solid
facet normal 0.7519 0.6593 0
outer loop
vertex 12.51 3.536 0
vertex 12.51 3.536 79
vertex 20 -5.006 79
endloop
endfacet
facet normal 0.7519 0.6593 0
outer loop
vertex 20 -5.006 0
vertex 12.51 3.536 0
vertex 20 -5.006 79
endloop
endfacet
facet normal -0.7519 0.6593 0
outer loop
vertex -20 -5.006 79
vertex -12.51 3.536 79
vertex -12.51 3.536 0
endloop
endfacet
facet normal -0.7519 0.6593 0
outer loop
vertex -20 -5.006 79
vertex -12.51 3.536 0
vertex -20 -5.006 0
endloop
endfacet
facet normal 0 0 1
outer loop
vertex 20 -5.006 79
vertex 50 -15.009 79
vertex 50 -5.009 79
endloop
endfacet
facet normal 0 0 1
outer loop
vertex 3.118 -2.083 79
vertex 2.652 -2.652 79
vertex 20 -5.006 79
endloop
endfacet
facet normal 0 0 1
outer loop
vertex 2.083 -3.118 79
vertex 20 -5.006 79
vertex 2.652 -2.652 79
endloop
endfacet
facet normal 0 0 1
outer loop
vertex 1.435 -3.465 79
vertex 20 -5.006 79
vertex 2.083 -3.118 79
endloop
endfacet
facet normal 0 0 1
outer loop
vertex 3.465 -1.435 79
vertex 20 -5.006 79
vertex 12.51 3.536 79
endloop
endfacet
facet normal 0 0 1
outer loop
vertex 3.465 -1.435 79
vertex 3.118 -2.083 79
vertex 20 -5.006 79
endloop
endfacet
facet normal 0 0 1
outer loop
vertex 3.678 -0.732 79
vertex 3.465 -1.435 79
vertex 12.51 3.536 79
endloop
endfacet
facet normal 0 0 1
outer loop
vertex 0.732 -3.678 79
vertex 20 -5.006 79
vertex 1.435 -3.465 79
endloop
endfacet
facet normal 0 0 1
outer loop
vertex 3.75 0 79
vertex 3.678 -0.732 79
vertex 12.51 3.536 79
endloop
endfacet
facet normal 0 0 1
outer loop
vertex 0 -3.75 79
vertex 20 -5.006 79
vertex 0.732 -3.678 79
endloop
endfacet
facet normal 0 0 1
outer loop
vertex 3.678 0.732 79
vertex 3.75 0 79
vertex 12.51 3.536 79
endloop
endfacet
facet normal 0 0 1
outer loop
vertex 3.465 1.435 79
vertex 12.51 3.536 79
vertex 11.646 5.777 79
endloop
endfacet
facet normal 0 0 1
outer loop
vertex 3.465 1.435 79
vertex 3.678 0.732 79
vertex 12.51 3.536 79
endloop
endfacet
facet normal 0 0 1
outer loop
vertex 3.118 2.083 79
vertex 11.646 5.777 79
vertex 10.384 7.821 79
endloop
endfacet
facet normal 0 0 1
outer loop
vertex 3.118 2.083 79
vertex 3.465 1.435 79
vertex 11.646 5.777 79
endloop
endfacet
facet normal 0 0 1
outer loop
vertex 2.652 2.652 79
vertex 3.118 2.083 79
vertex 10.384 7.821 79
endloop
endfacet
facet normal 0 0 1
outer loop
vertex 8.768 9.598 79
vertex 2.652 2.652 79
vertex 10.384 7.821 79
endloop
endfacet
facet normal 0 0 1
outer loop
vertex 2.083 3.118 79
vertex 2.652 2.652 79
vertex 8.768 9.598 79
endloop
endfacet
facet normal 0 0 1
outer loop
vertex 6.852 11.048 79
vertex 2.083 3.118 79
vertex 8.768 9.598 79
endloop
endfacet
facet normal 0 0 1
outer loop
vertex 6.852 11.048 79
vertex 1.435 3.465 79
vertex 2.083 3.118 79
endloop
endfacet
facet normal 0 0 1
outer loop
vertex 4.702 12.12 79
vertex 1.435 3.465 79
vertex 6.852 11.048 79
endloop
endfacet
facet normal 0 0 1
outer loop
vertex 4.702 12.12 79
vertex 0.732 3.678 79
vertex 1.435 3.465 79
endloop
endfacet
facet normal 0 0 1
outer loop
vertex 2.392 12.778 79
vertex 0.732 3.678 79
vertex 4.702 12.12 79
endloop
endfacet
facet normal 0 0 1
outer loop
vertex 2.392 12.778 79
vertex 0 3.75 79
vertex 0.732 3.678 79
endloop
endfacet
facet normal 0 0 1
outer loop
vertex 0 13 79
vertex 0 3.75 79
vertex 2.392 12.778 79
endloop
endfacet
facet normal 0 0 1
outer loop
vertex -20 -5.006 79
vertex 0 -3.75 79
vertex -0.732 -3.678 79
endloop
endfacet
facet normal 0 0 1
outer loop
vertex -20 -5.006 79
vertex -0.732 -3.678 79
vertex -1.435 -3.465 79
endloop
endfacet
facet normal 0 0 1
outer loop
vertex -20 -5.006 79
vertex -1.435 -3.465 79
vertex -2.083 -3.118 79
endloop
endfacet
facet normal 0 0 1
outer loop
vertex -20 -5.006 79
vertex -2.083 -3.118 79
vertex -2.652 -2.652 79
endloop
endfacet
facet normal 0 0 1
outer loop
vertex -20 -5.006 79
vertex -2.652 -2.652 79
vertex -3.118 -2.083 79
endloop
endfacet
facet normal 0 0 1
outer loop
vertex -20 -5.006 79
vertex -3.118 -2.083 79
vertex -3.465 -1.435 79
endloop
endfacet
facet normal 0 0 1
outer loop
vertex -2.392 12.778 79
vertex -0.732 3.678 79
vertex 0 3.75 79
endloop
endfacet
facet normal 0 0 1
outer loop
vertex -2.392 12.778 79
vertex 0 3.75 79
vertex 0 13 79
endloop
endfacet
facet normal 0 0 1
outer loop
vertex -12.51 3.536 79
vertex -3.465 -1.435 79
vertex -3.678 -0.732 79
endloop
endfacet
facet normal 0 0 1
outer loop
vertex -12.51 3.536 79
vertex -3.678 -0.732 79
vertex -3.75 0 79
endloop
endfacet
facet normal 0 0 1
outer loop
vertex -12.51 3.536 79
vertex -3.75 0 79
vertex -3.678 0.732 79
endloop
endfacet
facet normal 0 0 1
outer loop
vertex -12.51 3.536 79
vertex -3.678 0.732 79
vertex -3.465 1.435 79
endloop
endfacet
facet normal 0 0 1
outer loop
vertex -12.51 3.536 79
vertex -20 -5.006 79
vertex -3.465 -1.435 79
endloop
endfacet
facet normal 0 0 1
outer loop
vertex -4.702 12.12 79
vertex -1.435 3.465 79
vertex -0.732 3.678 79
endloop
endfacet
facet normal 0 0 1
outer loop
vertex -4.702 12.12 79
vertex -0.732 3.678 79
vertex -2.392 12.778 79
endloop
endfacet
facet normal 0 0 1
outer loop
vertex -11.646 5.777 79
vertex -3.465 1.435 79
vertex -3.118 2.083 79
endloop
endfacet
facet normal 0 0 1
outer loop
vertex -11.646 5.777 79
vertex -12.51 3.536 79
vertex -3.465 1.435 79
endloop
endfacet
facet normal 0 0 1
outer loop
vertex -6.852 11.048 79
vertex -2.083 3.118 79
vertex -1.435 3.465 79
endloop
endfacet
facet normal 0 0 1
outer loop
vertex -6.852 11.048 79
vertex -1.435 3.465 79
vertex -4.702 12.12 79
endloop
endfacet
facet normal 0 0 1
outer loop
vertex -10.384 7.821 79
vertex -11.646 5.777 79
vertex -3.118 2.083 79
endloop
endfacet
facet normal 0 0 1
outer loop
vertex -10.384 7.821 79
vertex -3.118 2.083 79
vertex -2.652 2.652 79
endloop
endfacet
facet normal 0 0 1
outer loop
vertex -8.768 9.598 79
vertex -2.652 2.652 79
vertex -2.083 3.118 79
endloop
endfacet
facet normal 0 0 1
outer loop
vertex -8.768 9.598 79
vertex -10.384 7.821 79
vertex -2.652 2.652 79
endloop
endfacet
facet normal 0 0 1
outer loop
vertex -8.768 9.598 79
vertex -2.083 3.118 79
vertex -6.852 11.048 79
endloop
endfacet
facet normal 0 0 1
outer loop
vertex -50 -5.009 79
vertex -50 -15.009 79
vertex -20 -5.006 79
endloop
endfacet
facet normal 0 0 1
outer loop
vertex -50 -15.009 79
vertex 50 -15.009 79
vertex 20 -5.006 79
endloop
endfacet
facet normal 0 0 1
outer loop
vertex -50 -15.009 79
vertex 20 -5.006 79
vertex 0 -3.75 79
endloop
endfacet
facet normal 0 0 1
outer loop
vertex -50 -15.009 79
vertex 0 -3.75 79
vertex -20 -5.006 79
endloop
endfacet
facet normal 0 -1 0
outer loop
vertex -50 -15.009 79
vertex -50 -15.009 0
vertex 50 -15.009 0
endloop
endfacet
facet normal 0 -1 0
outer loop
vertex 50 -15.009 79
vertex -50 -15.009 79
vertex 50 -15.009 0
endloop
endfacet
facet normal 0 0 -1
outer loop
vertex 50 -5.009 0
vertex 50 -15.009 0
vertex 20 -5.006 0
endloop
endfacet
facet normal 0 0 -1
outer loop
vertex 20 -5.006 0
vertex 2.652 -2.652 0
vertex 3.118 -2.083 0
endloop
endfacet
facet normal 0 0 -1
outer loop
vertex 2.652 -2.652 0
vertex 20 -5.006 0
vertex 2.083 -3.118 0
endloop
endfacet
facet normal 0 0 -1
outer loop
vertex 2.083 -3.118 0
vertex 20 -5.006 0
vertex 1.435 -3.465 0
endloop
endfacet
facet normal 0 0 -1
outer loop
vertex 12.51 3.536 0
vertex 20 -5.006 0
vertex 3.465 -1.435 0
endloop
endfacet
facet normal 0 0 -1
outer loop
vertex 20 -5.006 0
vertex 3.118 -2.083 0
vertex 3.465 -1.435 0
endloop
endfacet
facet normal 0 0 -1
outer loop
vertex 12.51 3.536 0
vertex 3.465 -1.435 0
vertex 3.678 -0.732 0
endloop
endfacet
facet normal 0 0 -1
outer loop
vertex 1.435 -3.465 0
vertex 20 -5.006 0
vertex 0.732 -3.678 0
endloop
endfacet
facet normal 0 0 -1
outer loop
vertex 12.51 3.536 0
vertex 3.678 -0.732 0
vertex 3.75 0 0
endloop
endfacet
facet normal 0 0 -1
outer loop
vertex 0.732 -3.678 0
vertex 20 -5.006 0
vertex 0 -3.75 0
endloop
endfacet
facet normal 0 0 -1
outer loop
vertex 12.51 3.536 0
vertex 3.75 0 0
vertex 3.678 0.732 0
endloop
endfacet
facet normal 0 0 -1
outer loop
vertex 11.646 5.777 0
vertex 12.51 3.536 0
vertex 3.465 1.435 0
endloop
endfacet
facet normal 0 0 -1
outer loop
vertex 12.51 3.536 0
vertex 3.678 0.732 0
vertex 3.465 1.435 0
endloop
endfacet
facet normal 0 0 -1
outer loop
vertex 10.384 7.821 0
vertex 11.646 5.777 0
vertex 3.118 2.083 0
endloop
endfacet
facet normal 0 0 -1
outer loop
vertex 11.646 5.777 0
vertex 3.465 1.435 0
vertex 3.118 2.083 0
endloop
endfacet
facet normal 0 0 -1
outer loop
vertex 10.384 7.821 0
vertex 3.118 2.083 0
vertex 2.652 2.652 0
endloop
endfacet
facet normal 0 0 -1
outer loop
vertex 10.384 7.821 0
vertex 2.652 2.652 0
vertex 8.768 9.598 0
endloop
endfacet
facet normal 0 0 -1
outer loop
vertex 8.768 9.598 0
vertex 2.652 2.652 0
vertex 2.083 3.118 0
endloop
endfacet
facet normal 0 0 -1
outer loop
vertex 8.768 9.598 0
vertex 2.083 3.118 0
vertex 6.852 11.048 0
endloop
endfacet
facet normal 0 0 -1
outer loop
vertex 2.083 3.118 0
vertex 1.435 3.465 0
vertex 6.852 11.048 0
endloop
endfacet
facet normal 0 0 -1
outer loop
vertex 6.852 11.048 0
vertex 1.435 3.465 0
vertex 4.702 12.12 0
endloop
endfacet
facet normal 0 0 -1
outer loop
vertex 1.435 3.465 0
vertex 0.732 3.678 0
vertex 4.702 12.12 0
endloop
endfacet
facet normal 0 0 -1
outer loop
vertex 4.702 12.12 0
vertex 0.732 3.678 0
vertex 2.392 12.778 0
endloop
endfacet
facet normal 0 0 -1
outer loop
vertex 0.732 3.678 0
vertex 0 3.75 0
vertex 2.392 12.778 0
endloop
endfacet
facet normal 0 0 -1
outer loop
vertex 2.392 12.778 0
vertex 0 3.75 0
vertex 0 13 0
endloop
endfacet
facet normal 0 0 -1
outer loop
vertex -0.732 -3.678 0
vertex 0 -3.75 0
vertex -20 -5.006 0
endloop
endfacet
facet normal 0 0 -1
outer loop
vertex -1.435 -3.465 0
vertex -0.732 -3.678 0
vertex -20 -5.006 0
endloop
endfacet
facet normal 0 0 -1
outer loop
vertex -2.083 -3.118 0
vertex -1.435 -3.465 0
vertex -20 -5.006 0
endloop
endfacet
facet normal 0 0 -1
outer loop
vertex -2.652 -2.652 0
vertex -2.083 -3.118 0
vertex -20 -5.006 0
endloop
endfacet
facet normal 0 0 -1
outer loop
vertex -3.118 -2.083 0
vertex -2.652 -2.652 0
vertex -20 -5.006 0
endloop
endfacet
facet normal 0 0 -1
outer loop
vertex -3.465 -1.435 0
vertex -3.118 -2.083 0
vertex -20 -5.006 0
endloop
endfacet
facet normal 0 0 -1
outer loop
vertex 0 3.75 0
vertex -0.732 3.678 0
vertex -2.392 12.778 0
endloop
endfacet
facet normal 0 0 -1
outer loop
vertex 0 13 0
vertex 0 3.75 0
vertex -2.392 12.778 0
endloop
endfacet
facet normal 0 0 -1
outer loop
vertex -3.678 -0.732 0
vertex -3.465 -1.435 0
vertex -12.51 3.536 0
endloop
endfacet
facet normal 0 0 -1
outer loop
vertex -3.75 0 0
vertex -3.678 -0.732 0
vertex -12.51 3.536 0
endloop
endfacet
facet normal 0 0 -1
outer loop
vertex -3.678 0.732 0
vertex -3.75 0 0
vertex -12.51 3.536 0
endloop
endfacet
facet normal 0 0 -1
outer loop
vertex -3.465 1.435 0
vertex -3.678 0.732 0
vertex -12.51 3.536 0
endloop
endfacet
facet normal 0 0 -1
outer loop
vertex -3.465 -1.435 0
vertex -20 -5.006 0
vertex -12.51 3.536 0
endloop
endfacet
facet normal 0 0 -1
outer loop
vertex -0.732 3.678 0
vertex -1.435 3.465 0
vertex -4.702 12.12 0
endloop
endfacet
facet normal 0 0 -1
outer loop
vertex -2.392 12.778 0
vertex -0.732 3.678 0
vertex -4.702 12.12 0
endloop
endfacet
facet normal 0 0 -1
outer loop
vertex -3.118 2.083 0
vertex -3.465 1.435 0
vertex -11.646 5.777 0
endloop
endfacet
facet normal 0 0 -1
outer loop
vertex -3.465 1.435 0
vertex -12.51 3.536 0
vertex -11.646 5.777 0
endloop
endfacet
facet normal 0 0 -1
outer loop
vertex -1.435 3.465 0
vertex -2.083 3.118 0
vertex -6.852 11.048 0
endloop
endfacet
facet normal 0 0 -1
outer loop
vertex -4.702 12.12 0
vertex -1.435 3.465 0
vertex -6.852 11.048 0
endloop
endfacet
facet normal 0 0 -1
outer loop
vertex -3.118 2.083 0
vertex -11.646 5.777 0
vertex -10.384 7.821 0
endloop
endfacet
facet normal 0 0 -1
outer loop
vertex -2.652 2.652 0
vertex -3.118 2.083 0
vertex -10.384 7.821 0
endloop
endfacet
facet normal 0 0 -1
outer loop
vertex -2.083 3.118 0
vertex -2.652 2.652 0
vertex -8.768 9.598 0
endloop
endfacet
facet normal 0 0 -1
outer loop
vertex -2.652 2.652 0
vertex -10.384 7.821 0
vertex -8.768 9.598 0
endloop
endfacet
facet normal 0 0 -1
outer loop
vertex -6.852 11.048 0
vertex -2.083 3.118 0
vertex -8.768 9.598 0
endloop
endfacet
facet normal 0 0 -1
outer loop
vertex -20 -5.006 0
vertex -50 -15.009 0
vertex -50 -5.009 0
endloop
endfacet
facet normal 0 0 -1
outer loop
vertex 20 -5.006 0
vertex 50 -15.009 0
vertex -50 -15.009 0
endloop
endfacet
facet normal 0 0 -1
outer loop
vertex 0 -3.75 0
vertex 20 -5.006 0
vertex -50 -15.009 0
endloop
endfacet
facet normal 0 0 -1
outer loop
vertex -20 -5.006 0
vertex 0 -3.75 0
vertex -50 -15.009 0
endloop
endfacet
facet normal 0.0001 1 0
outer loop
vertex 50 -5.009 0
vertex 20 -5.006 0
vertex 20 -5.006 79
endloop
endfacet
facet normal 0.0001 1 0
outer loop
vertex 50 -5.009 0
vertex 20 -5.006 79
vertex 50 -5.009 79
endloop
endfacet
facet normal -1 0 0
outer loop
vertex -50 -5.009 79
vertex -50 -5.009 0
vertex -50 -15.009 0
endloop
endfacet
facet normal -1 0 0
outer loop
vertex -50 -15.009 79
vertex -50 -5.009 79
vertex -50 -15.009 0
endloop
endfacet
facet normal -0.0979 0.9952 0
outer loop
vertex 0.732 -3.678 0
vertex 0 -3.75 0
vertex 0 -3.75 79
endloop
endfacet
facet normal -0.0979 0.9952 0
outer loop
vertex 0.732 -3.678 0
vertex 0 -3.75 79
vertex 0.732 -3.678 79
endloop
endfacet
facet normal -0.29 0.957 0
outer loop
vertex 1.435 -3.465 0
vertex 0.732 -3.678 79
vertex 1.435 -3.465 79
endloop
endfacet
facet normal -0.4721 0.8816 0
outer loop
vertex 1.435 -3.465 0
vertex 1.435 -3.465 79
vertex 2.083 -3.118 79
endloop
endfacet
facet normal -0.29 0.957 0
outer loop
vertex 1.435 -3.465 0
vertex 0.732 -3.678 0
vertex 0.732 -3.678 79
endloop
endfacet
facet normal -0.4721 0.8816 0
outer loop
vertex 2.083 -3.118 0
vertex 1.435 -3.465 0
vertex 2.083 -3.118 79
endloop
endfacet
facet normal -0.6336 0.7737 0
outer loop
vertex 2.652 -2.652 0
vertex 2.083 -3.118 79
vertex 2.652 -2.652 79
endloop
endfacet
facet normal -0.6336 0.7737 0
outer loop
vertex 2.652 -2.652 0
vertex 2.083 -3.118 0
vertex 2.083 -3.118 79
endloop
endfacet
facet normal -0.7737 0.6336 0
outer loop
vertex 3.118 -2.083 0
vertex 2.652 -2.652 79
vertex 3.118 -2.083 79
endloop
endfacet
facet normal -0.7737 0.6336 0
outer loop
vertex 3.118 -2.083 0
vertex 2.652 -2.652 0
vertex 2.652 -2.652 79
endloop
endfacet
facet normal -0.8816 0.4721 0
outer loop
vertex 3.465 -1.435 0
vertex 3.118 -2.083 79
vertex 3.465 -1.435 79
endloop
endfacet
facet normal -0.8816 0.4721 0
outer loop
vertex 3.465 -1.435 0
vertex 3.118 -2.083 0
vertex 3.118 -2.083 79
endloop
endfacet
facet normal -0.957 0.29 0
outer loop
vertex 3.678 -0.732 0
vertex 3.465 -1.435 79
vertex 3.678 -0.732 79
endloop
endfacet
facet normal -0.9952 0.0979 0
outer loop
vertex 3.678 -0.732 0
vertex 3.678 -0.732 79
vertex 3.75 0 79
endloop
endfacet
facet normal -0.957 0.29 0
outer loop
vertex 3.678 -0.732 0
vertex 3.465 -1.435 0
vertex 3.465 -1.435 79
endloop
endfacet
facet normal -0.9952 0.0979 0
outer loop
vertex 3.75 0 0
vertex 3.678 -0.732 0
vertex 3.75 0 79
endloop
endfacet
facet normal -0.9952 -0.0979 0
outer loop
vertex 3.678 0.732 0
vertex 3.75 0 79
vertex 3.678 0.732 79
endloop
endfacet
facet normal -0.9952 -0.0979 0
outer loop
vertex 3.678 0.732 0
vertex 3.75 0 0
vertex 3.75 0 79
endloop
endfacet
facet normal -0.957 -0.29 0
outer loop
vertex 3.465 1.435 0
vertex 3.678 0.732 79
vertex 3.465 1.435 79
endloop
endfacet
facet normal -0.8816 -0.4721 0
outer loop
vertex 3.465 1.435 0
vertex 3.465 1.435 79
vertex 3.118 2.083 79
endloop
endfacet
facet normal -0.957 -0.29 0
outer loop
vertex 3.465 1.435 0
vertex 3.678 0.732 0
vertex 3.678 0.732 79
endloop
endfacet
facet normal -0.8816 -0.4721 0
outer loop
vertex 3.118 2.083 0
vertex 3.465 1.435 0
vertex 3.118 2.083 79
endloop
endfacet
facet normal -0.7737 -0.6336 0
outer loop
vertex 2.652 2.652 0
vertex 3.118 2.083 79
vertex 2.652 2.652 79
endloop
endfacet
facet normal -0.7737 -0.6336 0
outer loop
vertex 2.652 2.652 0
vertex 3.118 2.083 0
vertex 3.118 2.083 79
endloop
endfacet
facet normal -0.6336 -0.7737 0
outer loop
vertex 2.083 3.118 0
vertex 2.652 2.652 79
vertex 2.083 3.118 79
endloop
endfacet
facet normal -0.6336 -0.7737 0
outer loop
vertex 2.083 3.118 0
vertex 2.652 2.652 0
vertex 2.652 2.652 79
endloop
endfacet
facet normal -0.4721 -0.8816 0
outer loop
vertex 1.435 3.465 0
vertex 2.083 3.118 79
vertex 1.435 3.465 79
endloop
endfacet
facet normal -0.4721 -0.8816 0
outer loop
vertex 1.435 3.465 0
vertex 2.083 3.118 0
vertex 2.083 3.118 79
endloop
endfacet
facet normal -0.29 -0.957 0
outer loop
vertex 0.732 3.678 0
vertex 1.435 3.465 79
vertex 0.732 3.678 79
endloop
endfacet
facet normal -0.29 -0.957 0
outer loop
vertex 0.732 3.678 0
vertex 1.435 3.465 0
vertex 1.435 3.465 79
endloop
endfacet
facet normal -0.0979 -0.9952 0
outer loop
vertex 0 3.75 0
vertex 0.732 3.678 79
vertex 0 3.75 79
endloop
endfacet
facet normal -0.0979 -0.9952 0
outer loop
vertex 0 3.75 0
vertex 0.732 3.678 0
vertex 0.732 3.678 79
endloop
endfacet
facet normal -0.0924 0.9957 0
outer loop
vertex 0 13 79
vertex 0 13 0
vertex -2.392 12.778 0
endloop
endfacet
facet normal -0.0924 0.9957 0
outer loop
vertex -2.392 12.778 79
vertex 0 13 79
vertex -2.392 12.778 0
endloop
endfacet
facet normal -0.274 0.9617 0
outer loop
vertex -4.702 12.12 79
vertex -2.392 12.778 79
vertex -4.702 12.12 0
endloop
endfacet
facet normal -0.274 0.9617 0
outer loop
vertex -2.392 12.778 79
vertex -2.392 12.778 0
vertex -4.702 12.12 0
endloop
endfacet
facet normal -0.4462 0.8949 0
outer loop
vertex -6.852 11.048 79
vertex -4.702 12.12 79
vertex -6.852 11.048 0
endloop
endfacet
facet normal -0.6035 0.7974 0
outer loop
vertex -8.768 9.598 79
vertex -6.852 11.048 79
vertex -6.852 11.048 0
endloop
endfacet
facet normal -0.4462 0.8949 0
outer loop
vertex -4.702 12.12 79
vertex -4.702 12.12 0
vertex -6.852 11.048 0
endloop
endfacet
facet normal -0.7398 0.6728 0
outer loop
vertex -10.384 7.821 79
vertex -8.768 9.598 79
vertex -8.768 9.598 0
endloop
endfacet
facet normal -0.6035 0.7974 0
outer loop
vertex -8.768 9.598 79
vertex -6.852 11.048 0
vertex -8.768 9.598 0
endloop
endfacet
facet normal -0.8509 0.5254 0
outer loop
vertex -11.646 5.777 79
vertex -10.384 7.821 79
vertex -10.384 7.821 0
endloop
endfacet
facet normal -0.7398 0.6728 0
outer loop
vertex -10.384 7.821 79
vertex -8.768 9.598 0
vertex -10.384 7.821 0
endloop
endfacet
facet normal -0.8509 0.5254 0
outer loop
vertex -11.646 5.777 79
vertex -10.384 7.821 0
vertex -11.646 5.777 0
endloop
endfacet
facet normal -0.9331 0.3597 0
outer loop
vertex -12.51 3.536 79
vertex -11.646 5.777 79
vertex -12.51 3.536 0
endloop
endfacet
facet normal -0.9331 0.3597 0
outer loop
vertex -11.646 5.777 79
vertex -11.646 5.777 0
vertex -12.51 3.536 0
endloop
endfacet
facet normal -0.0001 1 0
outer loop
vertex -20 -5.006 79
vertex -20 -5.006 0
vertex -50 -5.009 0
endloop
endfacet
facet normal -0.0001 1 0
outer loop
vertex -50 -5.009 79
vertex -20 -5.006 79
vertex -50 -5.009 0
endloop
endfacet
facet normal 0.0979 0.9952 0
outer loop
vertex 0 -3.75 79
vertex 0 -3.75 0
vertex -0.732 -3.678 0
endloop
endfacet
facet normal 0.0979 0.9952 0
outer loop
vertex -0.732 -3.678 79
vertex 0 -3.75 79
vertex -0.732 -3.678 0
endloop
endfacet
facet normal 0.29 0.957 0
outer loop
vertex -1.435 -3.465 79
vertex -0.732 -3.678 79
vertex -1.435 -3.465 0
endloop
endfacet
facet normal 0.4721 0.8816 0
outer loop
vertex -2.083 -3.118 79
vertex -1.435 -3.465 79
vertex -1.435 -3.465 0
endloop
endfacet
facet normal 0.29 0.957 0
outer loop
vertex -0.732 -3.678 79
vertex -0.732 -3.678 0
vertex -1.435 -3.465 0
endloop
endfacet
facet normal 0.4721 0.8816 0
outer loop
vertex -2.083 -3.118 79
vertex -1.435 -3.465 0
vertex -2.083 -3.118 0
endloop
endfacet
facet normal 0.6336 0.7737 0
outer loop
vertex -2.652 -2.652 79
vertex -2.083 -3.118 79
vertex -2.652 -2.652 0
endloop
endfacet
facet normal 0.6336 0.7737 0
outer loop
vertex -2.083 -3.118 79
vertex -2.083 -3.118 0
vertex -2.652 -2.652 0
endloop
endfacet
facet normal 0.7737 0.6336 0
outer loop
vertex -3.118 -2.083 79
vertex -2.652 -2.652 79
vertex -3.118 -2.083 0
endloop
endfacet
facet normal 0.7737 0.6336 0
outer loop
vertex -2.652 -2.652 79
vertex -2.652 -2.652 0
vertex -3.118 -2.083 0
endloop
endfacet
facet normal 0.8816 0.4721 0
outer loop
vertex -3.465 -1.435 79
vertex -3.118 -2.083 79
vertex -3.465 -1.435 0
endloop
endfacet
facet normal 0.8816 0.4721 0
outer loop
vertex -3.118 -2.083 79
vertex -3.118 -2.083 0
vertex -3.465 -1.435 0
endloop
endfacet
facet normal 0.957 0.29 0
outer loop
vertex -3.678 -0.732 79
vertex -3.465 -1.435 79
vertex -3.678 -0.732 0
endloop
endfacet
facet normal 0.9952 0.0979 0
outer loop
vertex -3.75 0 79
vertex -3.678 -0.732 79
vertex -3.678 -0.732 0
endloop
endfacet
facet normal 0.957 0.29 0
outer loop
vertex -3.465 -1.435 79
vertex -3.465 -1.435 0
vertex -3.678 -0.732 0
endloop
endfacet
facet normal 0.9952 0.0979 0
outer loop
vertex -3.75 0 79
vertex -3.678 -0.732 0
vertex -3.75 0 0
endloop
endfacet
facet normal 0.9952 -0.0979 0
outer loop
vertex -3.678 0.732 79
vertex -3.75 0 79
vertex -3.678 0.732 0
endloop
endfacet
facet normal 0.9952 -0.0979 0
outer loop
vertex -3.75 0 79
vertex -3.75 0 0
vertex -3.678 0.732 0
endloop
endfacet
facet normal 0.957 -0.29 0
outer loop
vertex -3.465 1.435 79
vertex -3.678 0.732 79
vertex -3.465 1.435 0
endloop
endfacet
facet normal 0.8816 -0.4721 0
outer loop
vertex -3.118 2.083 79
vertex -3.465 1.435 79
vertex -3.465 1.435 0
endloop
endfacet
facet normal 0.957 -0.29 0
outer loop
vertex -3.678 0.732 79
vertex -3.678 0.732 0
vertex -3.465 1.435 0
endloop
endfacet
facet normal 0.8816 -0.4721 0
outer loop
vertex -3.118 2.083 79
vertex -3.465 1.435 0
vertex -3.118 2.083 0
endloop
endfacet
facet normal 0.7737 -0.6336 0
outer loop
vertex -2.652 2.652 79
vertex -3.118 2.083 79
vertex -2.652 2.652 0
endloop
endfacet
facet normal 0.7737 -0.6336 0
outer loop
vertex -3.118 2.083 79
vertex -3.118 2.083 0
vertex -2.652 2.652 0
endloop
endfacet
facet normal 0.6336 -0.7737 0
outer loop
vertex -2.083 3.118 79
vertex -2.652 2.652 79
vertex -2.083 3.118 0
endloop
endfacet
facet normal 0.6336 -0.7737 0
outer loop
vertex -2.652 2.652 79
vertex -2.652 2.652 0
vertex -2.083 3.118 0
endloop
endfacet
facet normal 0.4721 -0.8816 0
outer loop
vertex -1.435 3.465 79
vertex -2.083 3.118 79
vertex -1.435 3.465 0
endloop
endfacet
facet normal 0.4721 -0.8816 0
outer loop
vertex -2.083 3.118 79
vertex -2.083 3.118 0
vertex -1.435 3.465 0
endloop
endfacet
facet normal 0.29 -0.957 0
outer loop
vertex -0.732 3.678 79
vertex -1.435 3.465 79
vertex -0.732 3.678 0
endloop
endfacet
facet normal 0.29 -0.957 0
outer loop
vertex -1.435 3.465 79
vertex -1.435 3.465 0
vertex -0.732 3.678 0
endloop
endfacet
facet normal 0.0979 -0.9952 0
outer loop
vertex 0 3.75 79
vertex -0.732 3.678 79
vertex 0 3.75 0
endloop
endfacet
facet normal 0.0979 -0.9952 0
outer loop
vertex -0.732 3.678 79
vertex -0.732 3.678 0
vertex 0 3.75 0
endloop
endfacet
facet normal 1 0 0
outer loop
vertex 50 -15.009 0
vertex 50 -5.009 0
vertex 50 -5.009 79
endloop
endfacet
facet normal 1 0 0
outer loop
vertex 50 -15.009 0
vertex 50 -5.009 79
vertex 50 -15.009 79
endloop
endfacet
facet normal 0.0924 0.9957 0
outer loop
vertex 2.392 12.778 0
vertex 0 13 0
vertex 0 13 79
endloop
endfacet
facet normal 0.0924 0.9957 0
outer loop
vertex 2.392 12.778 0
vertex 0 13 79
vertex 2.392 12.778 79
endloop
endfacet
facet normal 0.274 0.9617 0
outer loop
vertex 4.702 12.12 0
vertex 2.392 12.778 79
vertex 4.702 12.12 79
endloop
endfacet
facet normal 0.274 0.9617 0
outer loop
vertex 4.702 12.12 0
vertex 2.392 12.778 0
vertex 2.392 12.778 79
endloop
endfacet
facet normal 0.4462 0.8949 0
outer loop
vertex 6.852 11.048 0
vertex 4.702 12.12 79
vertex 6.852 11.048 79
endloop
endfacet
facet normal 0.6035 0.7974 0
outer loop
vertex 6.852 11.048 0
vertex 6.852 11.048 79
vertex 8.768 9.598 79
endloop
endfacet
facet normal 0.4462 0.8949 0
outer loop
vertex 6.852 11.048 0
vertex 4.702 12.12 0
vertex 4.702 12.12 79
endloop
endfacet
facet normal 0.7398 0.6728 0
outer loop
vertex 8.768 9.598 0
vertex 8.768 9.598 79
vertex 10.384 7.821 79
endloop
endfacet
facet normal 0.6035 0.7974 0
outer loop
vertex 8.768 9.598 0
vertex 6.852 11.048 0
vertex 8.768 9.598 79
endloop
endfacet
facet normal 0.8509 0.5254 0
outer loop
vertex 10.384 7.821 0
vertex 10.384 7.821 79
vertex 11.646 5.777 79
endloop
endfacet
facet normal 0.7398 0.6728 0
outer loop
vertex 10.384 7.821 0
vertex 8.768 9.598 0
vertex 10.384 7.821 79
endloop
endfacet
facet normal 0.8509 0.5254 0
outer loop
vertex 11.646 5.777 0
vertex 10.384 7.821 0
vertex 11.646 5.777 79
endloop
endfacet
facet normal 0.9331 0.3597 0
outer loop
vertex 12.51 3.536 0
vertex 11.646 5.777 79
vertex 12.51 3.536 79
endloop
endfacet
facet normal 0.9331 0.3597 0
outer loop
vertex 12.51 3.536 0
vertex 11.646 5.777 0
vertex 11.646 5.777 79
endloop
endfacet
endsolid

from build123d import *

# Parameters (mm, degrees)
EXTRUDE_DEPTH = 79


with BuildPart() as extrude_pulky:
    # Part__Mirroring → Extrude (new body)
    with BuildSketch(Plane(origin=(-25, -1.004737, 0), x_dir=(0, 1, 0), z_dir=(0, 0, 1))):
        with BuildLine():
            ThreePointArc((14.004737, -25), (11.372036, -17.156587), (4.540257, -12.49))
            Line((4.540257, -12.49), (-4.000791, -5))
            Line((-4.000791, -5), (-4.004737, 25))
            Line((-4.004737, 25), (-14.004737, 25))
            Line((-14.004737, 25), (-14.004737, -25))
            Line((-14.004737, -25), (-2.745263, -25))
            ThreePointArc((-2.745263, -25), (1.004737, -21.25), (4.754737, -25))
            Line((4.754737, -25), (14.004737, -25))
        make_face()
    extrude(amount=EXTRUDE_DEPTH)


with BuildPart() as fusion:
    # Part__Mirroring001: instance of Extrude_pulky
    add(extrude_pulky.part.mirror(Plane(origin=(0, 0, 0), x_dir=(0, -1, 0), z_dir=(1, 0, 0))))

    # Fusion: union Extrude_pulky
    add(extrude_pulky.part)


solid = fusion.part
